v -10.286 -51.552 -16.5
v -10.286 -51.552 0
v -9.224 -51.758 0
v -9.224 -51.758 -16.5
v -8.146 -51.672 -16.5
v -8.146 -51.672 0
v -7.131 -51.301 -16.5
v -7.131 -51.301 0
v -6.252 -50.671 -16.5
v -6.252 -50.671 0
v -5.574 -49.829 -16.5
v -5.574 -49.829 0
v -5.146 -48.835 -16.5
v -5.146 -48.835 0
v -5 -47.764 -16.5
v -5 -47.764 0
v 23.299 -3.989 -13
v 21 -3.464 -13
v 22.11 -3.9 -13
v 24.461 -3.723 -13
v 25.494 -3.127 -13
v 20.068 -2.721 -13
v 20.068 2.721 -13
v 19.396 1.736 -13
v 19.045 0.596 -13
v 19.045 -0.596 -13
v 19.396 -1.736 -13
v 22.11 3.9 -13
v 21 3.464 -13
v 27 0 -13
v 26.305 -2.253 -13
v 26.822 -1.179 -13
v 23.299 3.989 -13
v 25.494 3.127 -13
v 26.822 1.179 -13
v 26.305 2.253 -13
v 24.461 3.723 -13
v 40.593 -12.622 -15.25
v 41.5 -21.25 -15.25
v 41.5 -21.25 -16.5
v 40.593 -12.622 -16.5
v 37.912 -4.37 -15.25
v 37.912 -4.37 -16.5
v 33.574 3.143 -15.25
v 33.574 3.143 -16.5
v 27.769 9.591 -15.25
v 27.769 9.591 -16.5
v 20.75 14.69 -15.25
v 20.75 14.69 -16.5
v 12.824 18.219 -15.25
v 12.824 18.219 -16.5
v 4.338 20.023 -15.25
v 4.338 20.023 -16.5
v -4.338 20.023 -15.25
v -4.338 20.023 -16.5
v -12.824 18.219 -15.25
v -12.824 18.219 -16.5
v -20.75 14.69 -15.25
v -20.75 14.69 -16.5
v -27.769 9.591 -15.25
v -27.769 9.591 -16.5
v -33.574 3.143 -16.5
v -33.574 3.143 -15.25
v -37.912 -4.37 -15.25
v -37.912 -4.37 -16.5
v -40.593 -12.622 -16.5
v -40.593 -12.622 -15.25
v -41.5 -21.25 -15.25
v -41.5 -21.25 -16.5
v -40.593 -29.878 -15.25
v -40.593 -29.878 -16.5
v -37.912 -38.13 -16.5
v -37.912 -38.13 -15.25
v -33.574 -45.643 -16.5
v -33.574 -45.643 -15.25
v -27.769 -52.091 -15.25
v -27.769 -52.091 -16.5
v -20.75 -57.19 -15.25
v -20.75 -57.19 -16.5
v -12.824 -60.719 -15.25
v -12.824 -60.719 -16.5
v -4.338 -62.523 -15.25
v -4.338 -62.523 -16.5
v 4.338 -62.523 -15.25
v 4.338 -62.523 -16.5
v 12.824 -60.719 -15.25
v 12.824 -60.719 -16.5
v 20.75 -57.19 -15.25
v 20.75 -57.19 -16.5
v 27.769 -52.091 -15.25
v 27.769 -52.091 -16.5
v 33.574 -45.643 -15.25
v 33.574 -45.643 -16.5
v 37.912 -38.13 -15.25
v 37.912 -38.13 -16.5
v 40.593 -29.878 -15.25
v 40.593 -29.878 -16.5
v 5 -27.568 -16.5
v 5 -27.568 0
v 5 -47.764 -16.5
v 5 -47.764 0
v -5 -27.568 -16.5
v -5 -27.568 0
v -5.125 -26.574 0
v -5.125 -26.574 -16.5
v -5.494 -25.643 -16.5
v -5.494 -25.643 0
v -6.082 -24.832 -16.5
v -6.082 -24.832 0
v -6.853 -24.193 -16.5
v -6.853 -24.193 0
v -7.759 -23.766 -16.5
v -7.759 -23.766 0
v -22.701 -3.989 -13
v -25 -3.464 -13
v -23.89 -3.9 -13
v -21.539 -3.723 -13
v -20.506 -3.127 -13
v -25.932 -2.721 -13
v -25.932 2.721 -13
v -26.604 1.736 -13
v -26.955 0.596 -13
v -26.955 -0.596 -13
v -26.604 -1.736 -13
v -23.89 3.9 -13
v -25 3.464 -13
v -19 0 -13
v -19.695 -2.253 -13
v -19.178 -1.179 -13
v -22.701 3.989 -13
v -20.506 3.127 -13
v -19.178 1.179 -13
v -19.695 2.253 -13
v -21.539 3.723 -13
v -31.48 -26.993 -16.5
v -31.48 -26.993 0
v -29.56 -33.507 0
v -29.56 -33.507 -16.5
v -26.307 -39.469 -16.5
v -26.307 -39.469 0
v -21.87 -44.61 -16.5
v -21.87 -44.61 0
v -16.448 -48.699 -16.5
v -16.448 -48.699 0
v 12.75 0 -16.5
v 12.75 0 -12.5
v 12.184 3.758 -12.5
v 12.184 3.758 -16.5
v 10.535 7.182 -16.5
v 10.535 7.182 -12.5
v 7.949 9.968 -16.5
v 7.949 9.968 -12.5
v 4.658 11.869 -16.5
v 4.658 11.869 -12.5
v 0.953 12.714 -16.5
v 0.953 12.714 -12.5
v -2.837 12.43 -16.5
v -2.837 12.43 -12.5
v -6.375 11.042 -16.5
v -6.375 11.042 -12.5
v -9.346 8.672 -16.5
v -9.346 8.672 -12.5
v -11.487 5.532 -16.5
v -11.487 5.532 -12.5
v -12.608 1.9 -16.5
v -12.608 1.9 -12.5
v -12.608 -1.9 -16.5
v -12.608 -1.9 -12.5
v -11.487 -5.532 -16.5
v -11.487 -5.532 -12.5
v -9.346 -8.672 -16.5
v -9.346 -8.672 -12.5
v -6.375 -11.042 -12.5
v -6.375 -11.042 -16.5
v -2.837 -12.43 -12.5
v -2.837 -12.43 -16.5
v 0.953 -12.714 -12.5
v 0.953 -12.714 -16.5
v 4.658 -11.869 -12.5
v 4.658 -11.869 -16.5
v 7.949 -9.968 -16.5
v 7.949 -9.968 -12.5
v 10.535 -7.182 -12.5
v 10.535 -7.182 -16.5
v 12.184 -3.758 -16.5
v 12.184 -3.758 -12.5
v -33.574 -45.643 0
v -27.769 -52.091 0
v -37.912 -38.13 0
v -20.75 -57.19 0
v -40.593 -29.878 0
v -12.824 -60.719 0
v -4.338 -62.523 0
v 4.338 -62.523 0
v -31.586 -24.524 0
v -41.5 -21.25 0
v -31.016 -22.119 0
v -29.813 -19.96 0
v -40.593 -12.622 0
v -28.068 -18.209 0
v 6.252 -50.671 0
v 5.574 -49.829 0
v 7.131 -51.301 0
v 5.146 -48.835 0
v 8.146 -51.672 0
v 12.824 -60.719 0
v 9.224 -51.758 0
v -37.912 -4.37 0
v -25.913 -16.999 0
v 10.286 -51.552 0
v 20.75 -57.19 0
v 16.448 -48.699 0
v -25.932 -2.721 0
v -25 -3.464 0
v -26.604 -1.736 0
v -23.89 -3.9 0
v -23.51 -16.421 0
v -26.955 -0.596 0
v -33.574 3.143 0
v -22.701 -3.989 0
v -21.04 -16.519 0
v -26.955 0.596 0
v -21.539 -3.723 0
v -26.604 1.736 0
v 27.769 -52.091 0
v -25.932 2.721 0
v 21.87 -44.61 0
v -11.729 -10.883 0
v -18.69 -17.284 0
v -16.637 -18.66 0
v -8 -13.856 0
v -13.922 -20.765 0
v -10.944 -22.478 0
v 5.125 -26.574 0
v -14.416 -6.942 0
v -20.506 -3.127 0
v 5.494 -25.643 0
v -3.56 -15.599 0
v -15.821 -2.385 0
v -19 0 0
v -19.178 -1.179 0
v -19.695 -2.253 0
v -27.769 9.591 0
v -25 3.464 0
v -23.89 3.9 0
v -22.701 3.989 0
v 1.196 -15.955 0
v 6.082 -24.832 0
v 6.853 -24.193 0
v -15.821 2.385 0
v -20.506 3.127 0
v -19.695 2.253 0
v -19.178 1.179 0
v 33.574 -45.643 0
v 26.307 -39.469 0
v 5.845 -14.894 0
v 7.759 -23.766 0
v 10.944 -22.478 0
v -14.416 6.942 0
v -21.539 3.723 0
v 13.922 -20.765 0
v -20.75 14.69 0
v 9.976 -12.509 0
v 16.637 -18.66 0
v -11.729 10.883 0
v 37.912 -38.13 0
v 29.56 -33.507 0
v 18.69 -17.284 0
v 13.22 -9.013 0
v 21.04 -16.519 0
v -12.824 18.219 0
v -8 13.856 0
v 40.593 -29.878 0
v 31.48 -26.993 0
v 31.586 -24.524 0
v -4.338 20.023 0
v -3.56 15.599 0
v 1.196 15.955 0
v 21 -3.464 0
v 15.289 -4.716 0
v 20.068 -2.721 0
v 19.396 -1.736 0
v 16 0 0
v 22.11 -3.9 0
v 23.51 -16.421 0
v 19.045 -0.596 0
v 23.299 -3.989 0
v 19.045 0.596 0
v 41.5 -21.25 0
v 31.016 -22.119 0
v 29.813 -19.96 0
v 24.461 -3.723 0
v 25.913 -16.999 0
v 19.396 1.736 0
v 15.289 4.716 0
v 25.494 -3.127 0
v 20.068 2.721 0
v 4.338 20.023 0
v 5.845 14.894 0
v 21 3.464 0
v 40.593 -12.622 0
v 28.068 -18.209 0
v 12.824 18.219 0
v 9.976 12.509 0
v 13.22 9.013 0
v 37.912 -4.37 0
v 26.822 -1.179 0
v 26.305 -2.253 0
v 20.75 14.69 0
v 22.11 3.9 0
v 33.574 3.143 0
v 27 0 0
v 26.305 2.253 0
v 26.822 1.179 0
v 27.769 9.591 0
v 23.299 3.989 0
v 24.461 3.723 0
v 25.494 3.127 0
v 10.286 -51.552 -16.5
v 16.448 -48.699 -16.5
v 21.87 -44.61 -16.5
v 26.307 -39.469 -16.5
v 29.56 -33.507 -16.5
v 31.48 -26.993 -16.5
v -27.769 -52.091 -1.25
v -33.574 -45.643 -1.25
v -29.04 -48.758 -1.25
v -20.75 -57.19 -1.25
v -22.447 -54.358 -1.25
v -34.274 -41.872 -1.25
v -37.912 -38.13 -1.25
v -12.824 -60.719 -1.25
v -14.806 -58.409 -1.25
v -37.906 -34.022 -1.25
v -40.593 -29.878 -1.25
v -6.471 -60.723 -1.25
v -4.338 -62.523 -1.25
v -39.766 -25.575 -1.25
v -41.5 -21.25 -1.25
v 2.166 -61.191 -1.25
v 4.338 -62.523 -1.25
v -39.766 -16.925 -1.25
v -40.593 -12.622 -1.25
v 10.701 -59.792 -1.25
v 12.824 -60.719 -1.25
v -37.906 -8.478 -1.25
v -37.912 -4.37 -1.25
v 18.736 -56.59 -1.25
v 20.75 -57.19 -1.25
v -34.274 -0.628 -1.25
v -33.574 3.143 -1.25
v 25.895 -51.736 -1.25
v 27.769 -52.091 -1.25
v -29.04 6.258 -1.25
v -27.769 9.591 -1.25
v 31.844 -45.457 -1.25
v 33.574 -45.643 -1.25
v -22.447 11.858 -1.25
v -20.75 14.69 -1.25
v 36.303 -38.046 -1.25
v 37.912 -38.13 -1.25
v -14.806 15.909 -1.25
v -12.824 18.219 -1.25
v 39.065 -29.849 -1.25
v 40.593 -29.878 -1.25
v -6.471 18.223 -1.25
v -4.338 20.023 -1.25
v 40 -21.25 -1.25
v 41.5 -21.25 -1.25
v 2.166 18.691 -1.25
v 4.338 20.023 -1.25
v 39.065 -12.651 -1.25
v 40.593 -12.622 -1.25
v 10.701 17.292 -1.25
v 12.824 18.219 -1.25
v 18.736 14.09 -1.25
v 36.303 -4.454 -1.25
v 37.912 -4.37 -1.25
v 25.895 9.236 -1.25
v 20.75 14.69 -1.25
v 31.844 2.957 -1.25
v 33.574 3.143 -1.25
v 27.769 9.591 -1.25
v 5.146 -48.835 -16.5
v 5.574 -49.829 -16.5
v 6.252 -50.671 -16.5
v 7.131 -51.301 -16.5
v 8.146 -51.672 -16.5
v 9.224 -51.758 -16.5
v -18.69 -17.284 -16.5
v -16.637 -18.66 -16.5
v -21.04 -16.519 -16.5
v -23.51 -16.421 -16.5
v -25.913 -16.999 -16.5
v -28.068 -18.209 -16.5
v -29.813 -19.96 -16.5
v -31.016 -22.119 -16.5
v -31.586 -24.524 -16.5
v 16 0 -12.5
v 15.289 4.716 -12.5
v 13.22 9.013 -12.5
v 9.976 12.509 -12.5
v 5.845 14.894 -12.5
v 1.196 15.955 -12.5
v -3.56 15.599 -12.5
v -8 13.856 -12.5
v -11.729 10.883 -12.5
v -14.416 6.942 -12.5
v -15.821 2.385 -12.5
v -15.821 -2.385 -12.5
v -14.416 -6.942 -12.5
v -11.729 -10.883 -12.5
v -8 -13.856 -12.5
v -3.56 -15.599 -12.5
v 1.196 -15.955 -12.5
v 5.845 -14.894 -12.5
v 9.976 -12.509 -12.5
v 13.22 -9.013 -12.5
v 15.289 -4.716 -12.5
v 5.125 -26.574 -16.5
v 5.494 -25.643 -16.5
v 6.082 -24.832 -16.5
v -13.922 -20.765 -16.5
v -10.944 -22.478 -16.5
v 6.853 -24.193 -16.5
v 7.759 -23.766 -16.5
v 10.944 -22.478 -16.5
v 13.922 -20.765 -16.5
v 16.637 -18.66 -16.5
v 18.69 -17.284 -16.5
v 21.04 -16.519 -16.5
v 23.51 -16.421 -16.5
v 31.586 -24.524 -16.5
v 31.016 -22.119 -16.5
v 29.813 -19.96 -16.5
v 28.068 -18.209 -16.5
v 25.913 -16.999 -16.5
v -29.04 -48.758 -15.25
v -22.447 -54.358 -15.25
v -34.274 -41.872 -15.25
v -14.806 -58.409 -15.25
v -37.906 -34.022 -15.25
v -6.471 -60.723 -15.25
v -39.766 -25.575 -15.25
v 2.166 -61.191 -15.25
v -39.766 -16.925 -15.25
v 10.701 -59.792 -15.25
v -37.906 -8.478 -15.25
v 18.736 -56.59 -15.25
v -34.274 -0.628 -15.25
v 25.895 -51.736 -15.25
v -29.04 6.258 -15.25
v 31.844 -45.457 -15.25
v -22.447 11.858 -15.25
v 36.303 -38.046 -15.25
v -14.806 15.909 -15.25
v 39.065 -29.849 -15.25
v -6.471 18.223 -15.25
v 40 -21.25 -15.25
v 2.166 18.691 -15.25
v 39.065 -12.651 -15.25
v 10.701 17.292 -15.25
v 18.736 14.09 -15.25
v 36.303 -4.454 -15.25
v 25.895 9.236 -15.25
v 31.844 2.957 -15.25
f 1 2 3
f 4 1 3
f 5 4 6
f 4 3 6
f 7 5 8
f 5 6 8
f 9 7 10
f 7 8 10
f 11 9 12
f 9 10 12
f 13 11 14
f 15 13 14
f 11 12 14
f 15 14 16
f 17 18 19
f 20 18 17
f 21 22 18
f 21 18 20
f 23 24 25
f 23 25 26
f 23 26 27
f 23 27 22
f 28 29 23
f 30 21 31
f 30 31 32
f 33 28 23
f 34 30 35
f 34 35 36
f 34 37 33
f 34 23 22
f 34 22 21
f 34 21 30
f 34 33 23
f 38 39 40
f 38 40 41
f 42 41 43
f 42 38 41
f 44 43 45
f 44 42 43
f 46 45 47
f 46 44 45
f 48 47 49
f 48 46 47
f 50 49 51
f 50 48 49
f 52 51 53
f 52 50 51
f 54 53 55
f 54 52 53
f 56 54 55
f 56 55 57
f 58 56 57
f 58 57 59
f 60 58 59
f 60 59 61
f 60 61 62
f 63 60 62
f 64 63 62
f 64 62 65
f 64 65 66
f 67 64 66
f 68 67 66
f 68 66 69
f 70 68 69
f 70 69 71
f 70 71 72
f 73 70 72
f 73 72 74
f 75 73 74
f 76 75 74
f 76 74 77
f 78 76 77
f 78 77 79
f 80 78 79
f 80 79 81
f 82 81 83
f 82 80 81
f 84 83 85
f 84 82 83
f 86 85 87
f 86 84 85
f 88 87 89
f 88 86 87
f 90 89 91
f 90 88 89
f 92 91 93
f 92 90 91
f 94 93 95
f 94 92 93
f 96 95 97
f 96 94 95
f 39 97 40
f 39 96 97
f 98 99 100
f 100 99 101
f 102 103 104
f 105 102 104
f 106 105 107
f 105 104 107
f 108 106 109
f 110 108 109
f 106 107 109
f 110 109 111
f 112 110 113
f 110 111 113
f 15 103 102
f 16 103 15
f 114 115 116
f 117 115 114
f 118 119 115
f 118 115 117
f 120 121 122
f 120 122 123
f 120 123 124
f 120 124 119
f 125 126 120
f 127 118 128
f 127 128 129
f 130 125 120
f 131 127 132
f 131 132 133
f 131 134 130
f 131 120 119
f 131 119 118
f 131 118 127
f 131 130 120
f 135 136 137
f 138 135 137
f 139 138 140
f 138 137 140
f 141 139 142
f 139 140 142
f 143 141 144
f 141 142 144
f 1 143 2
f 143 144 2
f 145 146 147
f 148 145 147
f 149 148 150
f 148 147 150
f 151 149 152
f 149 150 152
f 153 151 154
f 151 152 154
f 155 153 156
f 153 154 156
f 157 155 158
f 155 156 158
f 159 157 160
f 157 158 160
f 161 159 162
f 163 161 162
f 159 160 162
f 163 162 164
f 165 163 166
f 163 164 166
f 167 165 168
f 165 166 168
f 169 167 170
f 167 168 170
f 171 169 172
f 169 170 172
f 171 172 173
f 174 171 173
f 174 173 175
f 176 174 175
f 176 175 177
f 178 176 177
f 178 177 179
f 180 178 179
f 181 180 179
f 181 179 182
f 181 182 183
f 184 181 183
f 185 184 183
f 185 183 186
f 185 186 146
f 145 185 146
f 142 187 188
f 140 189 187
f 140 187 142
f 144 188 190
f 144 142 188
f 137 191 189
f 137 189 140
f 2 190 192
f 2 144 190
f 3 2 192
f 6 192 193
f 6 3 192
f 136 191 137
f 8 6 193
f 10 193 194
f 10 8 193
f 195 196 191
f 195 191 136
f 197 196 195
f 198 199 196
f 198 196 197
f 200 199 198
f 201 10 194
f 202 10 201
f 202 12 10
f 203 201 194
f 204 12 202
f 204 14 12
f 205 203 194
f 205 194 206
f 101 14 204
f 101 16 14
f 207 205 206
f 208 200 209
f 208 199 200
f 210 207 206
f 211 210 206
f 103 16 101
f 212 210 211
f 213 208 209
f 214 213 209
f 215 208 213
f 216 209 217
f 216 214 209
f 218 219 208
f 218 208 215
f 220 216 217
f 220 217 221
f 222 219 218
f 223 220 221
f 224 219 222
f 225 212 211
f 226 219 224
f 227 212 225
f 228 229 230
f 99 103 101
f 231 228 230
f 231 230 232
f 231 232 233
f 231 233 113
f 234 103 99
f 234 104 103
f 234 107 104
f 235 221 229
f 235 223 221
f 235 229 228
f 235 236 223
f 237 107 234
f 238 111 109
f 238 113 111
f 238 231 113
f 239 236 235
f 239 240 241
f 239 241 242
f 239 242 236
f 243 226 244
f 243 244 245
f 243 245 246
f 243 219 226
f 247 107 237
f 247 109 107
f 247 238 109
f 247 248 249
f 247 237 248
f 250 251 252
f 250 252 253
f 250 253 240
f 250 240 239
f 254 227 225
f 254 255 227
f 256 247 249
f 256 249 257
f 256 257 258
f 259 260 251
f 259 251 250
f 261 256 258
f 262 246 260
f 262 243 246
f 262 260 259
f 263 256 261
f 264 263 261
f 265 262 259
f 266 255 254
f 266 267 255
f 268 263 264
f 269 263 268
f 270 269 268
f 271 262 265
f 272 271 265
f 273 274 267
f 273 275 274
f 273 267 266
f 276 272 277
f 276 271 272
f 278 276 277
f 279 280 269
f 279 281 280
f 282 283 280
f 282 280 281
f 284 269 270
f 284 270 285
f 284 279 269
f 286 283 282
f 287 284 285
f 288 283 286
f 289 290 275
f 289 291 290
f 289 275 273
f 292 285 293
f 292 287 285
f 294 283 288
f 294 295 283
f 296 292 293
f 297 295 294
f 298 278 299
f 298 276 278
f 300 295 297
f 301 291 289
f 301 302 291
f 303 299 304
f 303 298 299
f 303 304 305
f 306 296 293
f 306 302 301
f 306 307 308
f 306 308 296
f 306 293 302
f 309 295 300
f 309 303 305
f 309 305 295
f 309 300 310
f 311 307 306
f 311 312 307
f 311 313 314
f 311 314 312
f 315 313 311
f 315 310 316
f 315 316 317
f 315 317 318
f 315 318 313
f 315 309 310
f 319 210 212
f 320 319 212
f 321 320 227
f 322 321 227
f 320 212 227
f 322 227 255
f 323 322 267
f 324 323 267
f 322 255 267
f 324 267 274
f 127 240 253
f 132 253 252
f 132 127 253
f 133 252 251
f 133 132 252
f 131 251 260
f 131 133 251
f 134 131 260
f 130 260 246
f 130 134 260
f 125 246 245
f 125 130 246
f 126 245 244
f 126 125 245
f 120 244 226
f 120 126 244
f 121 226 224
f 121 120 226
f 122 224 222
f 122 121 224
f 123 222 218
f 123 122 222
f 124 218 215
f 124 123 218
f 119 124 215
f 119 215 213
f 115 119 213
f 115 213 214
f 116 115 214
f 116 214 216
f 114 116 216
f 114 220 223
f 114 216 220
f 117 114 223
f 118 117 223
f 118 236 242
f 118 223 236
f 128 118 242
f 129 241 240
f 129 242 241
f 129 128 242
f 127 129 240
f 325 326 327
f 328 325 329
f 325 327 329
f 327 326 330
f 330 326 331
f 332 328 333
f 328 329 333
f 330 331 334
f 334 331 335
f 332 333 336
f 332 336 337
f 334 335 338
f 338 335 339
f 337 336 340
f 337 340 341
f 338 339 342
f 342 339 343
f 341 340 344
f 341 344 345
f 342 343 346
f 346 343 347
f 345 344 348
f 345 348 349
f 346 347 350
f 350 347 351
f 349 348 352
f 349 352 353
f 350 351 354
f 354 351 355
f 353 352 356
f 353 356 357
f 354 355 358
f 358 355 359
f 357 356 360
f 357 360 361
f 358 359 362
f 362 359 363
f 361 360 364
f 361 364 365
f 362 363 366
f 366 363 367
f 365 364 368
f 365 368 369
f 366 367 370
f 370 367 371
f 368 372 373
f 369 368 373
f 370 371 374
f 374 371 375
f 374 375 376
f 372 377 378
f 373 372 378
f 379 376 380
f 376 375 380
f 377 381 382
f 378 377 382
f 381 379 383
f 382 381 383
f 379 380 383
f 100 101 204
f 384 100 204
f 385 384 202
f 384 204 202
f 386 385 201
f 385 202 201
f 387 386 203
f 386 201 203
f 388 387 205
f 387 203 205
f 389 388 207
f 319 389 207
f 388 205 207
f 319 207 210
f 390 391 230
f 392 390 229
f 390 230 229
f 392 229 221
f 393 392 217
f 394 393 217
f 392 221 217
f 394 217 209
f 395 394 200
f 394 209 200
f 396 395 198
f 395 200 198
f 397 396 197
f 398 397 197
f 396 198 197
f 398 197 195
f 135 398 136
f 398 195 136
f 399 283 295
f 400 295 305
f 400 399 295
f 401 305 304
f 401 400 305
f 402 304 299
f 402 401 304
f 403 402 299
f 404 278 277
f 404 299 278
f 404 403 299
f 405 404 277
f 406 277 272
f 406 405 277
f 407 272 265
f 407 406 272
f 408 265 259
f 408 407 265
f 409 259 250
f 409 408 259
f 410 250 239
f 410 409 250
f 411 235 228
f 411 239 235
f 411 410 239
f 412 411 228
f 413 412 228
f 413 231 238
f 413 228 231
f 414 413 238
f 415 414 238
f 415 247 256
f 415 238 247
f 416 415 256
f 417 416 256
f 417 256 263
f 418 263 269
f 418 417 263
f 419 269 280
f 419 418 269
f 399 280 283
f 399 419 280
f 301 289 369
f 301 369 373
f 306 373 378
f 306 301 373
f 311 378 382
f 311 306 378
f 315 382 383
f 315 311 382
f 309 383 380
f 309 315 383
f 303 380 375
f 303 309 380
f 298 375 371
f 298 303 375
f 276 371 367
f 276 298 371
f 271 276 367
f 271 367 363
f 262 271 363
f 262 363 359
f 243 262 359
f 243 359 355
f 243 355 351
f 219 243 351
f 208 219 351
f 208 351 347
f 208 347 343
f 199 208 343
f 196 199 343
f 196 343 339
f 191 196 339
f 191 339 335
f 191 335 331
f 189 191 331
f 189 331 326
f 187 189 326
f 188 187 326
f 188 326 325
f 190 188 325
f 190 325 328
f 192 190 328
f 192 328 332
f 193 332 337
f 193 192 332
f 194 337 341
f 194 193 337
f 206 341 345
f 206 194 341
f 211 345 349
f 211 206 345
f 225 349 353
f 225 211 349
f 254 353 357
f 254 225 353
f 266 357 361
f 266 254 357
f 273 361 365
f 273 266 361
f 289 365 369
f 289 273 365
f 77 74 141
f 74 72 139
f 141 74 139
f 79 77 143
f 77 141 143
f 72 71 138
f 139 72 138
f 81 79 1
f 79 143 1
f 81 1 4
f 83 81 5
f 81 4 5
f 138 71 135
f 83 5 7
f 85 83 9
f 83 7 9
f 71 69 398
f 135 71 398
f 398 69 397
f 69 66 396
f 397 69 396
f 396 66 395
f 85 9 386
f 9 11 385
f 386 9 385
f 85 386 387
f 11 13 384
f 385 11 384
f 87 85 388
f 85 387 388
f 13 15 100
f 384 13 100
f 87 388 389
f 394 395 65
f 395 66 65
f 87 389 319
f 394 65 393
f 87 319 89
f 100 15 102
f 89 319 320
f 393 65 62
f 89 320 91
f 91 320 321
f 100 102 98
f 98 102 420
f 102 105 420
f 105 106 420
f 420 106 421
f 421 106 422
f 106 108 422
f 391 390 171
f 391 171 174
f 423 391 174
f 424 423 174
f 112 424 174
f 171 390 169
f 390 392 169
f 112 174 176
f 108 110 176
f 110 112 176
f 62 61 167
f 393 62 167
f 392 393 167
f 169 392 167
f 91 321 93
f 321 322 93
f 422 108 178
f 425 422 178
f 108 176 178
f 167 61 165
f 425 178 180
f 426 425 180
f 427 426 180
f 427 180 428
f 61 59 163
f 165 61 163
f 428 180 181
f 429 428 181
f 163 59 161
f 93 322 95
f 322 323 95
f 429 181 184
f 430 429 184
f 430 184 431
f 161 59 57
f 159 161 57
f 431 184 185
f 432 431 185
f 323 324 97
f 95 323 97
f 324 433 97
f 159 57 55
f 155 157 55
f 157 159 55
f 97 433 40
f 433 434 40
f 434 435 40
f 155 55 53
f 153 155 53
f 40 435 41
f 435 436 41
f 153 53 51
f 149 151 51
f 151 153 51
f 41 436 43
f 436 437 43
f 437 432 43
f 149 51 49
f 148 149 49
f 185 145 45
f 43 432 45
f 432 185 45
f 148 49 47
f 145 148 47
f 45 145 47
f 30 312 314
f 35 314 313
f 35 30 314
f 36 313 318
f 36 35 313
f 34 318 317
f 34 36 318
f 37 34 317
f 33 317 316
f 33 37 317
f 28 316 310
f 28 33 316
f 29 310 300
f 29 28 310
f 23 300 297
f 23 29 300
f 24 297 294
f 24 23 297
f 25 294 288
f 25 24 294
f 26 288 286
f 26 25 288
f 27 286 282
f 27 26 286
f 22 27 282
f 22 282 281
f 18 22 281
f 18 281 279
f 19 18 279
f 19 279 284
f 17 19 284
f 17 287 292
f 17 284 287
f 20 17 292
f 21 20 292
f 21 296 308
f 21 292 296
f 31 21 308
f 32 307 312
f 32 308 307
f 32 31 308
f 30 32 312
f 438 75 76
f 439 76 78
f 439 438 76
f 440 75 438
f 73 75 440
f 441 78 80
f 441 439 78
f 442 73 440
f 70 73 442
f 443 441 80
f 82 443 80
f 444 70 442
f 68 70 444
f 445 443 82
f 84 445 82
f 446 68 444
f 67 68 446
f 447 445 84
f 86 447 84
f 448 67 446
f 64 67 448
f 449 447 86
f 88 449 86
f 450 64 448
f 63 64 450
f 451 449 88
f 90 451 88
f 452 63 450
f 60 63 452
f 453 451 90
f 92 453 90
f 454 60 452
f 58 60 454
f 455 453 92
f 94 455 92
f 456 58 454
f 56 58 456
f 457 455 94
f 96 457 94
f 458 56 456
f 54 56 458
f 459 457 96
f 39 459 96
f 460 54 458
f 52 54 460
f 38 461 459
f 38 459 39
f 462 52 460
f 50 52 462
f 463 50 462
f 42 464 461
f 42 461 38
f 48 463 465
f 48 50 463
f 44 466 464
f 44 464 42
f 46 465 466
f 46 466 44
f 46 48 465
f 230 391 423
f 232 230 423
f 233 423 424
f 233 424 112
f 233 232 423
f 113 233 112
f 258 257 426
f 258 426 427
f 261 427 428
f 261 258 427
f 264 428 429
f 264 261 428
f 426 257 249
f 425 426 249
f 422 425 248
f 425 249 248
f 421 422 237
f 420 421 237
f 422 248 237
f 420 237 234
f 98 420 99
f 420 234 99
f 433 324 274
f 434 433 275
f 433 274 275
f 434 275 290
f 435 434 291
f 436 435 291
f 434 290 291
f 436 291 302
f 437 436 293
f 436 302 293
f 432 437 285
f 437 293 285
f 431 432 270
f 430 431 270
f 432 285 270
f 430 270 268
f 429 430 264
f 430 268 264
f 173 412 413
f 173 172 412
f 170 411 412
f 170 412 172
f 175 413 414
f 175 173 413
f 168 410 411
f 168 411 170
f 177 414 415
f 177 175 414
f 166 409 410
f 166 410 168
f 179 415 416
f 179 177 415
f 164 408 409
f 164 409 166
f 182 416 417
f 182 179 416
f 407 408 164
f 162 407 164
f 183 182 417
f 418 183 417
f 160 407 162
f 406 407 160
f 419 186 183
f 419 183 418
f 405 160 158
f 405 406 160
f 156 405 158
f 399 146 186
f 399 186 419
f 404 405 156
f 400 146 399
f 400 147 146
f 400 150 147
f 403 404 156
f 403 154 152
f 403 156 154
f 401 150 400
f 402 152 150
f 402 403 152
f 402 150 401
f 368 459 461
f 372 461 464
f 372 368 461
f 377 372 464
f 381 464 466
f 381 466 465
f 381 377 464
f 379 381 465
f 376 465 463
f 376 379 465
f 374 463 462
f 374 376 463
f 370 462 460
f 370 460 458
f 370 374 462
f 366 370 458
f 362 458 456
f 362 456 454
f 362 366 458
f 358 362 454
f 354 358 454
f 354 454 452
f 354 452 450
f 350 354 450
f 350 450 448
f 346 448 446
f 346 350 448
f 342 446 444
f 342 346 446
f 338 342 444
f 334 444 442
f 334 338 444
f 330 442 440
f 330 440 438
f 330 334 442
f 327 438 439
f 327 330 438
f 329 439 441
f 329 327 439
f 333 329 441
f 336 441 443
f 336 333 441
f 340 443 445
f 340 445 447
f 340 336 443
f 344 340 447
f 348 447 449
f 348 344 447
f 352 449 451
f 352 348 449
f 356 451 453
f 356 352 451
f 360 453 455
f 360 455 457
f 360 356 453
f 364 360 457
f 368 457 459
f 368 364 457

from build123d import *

# Parameters (mm, degrees)
SKETCH005_R       = 41.5
SKETCH005_R_2     = 12.75
PAD001_DEPTH      = 16.5
CYLINDER003_R     = 16
CYLINDER003_DEPTH = 25.2
CYLINDER008_R     = 4
CYLINDER008_DEPTH = 25
CYLINDER009_R     = 4
CYLINDER009_DEPTH = 25
POCKET_START      = -1.25
SKETCH084_R       = 48
SKETCH084_R_2     = 40
POCKET_DEPTH      = 14


with BuildPart() as part:
    # Sketch005 → Pad001 (new body)
    with BuildSketch(Plane.XY):
        with Locations((0, -21.25)):
            Circle(SKETCH005_R)
        Circle(SKETCH005_R_2, mode=Mode.SUBTRACT)
        with BuildLine():
            ThreePointArc((-31.480397, -26.993223), (-24.225688, -42.15732), (-10.285714, -51.551882))
            ThreePointArc((-10.285714, -51.551882), (-6.670071, -51.015521), (-5, -47.764147))
            Line((-5, -27.568098), (-5, -47.764147))
            ThreePointArc((-5, -27.568098), (-5.762291, -25.219217), (-7.758621, -23.765601))
            ThreePointArc((-16.637158, -18.660251), (-12.462129, -21.672456), (-7.758621, -23.765601))
            ThreePointArc((-16.637158, -18.660251), (-27.032318, -17.53007), (-31.480397, -26.993223))
        make_face(mode=Mode.SUBTRACT)
        with BuildLine():
            ThreePointArc((10.285714, -51.551882), (24.225688, -42.15732), (31.480397, -26.993223))
            ThreePointArc((31.480397, -26.993223), (27.032318, -17.53007), (16.637158, -18.660251))
            ThreePointArc((7.758621, -23.765601), (12.462129, -21.672456), (16.637158, -18.660251))
            ThreePointArc((7.758621, -23.765601), (5.762291, -25.219217), (5, -27.568098))
            Line((5, -27.568098), (5, -47.764147))
            ThreePointArc((5, -47.764147), (6.670071, -51.015521), (10.285714, -51.551882))
        make_face(mode=Mode.SUBTRACT)
    extrude(amount=-PAD001_DEPTH)

    # Cylinder003 → Cylinder003 (cut)
    with BuildSketch(Plane.XY.offset(-12.5)):
        Circle(CYLINDER003_R)
    extrude(amount=CYLINDER003_DEPTH, mode=Mode.SUBTRACT)

    # Cylinder008 → Cylinder008 (cut)
    with BuildSketch(Plane(origin=(23, 0, -13), x_dir=(1, 0, 0), z_dir=(0, 0, 1))):
        Circle(CYLINDER008_R)
    extrude(amount=CYLINDER008_DEPTH, mode=Mode.SUBTRACT)

    # Cylinder009 → Cylinder009 (cut)
    with BuildSketch(Plane(origin=(-23, 0, -13), x_dir=(1, 0, 0), z_dir=(0, 0, 1))):
        Circle(CYLINDER009_R)
    extrude(amount=CYLINDER009_DEPTH, mode=Mode.SUBTRACT)

    # Sketch084 → Pocket (cut)
    with BuildSketch(Plane.XY.offset(POCKET_START)):
        with Locations((0, -21.25)):
            Circle(SKETCH084_R)
        with Locations((0, -21.25)):
            Circle(SKETCH084_R_2, mode=Mode.SUBTRACT)
    extrude(amount=-POCKET_DEPTH, mode=Mode.SUBTRACT)


solid = part.part
